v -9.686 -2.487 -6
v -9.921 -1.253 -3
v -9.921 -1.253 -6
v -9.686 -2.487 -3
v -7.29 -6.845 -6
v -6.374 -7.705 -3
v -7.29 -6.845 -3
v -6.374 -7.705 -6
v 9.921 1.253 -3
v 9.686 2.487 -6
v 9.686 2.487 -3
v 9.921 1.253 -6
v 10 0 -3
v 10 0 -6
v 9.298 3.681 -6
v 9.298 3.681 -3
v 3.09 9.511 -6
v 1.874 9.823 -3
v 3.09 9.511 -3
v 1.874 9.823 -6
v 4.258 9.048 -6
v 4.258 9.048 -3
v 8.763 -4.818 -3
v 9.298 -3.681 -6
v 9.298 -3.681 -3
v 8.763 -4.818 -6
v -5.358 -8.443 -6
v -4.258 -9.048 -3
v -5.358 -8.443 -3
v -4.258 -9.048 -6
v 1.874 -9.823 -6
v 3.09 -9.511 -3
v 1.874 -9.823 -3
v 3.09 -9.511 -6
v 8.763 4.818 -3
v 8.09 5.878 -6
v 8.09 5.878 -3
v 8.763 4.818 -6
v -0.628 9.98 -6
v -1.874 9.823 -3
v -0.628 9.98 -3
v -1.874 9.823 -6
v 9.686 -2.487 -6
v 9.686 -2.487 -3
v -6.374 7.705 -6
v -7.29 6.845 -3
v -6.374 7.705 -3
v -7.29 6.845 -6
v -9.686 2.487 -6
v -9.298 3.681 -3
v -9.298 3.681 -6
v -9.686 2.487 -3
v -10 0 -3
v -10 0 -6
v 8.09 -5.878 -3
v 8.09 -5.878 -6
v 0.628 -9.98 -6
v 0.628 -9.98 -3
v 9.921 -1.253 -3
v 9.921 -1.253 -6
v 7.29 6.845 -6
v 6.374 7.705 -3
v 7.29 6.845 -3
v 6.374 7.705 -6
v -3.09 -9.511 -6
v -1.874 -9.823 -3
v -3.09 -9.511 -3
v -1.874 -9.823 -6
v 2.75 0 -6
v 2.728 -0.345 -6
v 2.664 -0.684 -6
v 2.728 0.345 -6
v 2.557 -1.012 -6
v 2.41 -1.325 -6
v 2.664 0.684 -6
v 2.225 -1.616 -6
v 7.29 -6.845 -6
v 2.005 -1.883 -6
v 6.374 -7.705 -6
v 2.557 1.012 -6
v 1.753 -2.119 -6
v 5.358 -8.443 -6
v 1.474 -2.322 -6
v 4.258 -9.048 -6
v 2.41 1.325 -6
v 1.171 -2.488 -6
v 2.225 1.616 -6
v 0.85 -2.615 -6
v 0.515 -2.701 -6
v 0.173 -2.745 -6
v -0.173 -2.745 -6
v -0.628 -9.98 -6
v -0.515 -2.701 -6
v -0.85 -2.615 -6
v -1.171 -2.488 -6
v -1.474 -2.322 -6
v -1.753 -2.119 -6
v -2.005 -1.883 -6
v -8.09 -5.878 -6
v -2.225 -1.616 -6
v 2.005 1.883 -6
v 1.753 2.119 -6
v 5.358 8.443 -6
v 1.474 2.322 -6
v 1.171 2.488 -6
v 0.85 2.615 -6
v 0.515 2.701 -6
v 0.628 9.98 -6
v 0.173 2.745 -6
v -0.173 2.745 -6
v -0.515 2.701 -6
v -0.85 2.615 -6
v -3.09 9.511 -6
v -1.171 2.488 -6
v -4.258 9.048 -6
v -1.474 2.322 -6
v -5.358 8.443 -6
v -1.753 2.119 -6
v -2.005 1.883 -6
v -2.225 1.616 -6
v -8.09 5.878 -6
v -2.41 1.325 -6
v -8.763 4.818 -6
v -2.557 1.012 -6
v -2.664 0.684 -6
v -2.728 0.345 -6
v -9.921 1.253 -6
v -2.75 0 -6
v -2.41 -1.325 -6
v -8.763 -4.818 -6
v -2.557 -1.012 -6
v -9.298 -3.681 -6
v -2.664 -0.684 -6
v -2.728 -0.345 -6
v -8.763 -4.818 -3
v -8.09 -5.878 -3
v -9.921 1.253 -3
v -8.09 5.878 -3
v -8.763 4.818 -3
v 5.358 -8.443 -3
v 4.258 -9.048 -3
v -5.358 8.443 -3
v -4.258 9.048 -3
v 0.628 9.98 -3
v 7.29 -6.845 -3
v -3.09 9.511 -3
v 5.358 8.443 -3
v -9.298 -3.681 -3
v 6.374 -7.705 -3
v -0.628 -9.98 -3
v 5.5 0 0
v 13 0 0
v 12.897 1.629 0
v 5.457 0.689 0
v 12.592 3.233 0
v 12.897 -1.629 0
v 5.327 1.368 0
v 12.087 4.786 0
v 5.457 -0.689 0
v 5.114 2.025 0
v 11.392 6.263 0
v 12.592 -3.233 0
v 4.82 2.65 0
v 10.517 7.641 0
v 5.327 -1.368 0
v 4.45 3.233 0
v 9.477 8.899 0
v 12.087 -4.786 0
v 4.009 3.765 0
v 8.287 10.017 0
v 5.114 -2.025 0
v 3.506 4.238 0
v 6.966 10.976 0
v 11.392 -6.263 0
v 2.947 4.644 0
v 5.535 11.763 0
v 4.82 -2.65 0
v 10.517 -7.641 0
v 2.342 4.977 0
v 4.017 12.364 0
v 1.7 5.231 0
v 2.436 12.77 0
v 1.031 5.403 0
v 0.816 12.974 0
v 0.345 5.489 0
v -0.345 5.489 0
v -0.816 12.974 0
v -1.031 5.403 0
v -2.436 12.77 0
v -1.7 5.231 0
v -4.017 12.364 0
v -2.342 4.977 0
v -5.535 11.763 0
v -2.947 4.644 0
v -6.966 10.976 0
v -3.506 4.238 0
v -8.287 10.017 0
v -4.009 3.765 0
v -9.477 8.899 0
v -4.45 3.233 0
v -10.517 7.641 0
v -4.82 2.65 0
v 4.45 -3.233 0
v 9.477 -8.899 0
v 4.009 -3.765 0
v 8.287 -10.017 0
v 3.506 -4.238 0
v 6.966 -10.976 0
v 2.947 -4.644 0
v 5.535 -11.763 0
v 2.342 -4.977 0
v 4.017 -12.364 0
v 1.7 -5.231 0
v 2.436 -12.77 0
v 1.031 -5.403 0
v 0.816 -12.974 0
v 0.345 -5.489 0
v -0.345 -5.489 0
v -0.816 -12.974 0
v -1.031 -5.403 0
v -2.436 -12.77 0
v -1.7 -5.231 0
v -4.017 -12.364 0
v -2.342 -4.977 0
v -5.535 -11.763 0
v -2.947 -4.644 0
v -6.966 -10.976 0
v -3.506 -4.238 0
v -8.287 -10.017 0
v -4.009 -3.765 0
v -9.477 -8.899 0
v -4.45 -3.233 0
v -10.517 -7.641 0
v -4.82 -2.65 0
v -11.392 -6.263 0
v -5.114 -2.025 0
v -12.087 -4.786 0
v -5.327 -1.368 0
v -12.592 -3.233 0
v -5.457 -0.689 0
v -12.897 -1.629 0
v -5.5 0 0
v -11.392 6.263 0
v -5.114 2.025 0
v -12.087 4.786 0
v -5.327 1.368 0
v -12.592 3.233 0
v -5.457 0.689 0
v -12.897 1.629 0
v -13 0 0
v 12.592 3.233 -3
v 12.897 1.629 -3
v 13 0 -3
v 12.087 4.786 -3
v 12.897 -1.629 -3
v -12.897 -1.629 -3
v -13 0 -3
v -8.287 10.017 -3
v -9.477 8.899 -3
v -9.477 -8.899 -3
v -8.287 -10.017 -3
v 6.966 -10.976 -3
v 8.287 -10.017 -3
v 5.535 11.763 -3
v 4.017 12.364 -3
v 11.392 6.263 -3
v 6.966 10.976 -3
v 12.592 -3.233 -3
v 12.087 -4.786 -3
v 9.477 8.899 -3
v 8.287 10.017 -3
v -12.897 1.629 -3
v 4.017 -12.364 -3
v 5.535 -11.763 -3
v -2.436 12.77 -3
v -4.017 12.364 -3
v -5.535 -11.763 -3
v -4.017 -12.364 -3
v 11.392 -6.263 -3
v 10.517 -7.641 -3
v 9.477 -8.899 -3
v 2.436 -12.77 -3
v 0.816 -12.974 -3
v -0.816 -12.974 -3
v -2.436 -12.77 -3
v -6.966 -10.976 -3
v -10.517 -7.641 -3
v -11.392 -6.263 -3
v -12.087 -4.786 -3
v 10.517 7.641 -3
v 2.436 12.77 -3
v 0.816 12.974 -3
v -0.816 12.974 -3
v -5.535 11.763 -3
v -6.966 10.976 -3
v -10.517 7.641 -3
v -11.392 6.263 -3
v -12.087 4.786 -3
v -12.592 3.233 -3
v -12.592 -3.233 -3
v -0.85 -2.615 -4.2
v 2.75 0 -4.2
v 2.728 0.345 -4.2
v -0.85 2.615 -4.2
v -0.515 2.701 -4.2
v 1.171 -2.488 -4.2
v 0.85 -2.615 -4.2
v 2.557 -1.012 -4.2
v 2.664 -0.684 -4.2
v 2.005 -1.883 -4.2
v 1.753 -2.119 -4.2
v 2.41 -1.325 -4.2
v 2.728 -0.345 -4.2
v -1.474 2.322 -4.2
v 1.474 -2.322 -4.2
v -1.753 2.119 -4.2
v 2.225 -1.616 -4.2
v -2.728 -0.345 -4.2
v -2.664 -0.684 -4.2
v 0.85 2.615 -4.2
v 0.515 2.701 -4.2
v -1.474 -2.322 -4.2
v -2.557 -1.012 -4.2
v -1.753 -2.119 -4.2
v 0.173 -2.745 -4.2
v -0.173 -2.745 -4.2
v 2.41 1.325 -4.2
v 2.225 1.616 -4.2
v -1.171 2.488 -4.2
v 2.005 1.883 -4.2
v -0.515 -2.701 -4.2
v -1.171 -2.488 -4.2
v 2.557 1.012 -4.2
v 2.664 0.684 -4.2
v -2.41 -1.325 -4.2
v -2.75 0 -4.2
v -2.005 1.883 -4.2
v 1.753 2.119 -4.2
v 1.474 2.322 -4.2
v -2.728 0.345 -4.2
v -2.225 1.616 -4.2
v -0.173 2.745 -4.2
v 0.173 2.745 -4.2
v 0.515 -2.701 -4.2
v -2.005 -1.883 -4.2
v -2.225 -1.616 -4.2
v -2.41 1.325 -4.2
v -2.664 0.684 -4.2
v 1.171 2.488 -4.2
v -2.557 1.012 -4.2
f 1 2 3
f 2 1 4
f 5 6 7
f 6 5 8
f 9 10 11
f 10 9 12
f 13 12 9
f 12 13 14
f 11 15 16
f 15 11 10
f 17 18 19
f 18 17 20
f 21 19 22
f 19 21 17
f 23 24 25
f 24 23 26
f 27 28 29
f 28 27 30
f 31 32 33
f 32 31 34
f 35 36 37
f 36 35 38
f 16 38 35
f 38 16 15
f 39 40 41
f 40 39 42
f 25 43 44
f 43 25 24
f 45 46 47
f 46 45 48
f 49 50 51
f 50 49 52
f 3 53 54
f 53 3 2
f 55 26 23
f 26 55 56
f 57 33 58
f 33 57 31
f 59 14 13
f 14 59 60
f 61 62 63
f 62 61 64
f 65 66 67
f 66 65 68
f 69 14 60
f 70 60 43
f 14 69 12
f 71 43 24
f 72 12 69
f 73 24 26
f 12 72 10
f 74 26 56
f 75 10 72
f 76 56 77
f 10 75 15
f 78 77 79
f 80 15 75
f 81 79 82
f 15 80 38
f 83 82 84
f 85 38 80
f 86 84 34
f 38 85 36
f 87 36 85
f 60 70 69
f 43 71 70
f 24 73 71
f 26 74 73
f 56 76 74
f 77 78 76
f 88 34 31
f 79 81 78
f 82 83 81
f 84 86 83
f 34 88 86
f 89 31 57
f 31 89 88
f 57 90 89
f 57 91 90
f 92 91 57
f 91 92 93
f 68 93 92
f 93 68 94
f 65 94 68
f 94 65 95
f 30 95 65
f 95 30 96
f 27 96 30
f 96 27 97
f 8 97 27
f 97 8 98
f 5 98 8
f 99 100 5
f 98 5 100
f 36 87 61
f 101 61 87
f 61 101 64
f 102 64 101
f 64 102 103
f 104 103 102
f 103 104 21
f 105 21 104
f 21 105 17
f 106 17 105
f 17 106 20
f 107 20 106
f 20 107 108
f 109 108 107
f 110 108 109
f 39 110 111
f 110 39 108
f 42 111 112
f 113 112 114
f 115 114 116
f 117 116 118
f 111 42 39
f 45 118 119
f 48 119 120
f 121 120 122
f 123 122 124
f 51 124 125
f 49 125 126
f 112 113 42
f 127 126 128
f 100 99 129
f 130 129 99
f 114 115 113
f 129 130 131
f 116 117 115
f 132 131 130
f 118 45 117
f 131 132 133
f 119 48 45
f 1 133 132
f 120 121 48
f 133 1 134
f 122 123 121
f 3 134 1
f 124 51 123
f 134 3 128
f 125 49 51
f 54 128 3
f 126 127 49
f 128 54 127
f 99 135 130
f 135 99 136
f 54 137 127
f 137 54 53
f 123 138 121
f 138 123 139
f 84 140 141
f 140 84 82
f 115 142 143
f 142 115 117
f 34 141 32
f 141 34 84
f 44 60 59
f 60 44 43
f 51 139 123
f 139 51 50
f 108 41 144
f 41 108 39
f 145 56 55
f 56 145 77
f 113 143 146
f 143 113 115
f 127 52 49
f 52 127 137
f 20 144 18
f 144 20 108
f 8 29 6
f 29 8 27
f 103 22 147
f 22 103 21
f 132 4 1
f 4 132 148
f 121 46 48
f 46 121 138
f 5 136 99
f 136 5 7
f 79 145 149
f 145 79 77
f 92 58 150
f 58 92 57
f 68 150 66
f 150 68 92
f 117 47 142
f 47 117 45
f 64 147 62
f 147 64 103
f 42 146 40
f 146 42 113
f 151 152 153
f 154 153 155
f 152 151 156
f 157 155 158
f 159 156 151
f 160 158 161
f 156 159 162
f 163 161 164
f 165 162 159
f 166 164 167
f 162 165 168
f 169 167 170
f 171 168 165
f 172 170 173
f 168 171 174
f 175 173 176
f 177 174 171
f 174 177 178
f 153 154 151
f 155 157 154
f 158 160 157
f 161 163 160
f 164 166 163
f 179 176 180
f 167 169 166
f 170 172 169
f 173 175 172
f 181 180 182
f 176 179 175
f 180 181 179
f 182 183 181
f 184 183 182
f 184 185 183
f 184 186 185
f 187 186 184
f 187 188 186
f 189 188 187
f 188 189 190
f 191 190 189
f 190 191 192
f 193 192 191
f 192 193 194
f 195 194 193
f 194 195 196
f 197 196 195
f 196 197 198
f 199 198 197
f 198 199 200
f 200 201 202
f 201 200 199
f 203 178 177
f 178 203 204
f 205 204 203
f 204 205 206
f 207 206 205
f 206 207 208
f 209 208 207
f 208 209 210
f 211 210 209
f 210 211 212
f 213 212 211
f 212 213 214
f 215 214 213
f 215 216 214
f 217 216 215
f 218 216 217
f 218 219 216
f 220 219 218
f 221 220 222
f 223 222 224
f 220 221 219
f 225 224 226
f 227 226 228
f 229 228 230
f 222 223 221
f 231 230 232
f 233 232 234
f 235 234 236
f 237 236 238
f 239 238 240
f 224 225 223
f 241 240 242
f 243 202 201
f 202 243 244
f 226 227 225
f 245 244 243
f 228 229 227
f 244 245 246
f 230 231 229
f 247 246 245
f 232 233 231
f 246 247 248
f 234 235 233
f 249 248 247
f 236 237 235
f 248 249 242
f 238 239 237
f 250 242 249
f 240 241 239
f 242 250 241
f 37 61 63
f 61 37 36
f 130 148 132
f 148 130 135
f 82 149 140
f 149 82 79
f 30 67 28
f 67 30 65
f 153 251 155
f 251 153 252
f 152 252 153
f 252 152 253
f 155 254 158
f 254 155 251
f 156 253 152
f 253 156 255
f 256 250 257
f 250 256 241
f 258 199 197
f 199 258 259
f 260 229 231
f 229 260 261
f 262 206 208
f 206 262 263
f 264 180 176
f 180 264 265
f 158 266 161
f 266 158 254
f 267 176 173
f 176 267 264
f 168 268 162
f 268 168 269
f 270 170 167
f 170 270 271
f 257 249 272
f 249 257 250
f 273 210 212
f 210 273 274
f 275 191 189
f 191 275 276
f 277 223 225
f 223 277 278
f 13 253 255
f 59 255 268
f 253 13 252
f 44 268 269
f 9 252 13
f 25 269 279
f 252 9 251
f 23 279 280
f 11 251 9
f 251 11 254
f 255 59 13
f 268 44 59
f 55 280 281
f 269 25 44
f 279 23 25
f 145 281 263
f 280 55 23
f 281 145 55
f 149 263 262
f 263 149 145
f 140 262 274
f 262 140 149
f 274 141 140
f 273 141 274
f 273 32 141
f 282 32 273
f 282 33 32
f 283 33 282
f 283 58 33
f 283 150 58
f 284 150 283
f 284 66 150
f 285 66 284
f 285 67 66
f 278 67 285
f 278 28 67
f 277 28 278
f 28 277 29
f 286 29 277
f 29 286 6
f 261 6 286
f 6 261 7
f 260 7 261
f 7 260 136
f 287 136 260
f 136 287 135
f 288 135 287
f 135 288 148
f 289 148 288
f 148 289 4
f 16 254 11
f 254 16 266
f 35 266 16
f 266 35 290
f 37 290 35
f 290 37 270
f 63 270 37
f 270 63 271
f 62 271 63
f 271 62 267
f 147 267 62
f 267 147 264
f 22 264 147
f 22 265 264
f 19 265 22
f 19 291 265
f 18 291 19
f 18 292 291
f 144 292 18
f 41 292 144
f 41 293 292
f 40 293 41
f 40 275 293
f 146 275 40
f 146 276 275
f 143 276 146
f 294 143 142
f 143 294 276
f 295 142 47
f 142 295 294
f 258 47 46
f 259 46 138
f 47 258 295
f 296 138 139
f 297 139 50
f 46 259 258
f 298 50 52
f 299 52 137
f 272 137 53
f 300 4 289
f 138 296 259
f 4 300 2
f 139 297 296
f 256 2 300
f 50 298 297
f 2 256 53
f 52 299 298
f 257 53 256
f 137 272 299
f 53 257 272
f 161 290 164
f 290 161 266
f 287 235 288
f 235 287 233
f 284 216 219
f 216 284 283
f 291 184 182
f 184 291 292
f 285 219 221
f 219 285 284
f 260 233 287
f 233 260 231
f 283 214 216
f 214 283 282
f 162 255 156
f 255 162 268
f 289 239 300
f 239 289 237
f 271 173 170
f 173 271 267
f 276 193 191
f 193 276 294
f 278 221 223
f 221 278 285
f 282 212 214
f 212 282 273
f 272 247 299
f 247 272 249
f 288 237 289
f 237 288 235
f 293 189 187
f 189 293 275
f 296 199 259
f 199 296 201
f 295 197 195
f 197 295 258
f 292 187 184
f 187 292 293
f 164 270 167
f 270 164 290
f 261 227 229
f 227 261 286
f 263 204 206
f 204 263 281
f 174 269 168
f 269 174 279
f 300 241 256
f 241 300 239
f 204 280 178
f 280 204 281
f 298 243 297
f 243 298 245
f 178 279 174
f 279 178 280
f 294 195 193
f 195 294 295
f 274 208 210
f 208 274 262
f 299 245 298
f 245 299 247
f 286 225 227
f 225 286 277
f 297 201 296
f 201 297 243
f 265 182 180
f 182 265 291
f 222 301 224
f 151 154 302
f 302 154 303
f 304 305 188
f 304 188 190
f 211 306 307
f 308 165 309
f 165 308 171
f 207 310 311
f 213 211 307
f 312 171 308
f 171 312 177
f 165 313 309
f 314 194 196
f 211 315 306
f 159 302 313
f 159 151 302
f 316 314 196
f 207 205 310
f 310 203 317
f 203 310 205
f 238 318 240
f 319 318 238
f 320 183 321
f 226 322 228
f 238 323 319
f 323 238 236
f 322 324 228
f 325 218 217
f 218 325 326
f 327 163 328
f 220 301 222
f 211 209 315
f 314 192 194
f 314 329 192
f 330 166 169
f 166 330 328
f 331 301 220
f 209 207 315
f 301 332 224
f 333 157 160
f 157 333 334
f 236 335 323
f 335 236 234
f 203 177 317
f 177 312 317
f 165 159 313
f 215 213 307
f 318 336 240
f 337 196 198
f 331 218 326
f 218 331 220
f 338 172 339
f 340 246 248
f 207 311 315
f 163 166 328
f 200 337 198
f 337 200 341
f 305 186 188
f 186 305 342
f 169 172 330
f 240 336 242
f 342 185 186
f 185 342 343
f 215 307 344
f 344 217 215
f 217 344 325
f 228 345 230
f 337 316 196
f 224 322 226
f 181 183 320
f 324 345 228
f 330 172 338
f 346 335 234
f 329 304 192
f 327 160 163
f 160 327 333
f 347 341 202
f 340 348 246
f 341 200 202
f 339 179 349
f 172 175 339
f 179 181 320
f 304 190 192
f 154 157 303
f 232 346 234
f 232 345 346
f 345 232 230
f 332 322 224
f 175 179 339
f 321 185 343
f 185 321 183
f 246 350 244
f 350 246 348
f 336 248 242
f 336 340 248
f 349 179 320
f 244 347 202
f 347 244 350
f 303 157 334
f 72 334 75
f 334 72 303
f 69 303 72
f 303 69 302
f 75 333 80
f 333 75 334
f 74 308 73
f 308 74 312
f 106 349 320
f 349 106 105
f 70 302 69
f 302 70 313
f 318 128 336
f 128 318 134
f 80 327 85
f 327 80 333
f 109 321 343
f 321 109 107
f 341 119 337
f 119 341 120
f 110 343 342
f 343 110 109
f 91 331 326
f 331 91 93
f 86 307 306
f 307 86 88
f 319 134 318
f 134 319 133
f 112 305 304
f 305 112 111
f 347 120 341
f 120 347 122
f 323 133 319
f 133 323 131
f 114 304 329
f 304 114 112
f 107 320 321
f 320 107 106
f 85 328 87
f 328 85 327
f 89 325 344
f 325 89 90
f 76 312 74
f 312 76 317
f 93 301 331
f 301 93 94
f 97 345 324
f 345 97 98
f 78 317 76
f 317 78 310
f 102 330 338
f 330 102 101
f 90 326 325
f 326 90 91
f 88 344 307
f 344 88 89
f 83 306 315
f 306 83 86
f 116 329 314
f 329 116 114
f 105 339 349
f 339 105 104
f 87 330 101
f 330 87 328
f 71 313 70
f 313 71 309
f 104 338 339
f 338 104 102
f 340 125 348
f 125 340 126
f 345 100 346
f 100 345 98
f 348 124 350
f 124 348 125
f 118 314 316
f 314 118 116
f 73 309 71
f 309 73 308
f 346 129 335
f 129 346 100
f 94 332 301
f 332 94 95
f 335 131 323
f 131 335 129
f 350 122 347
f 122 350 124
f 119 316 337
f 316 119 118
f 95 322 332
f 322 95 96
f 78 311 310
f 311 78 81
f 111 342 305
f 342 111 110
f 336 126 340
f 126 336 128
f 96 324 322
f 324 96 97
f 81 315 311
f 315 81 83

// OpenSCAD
$fn = 50;


difference() {
	union() {
		translate(v = [0, 0, -6.0000000000]) {
			cylinder(h = 6, r = 10.0000000000);
		}
		translate(v = [0, 0, -3.0000000000]) {
			cylinder(h = 3, r = 13.0000000000);
		}
	}
	union() {
		translate(v = [0, 0, 0]) {
			rotate(a = [0, 0, 0]) {
				difference() {
					union() {
						#translate(v = [0, 0, -6.0000000000]) {
							cylinder(h = 6, r = 2.2500000000);
						}
						#translate(v = [0, 0, -4.2000000000]) {
							cylinder(h = 4.2000000000, r = 10.0000000000, r1 = 2.7500000000, r2 = 5.5000000000);
						}
						#translate(v = [0, 0, -6.0000000000]) {
							cylinder(h = 6, r = 2.7500000000);
						}
						#translate(v = [0, 0, -6.0000000000]) {
							cylinder(h = 6, r = 2.2500000000);
						}
					}
					union();
				}
			}
		}
	}
}
